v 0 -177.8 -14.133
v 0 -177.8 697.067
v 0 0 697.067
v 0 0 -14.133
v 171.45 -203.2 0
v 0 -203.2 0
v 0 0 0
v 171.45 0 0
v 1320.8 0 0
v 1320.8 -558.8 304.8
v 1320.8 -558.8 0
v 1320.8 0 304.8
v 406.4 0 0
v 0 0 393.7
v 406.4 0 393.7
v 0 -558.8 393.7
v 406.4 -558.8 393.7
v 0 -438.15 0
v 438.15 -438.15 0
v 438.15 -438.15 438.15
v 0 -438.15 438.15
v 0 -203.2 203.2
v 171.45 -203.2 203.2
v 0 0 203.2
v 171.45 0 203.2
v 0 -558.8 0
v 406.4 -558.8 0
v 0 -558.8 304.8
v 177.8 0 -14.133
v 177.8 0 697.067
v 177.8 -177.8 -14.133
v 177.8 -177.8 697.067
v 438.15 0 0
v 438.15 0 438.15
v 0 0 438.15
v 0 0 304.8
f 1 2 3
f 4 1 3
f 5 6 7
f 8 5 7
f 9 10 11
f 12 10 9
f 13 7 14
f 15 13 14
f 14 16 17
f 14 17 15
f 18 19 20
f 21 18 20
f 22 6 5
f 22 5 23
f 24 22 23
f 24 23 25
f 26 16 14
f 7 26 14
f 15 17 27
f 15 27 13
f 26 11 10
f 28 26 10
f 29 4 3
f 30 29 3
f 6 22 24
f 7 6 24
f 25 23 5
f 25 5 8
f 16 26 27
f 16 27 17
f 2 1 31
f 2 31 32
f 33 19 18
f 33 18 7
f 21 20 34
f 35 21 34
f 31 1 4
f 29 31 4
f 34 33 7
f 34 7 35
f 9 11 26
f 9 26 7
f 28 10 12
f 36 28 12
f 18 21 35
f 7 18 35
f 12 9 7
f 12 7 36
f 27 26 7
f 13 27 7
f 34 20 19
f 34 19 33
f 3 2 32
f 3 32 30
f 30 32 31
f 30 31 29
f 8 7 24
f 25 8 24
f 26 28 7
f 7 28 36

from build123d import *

# Parameters (mm, degrees)
F0_W     = 558.8
F0_H     = 393.7
F1_DEPTH = 406.4
F2_W     = 558.8
F2_H     = 304.8
F3_DEPTH = 1320.8
F4_W     = 177.8
F4_H     = 711.2
F5_DEPTH = 177.8
F6_W     = 438.15
F6_H     = 438.15
F7_DEPTH = 438.15
F8_W     = 203.2
F8_H     = 203.2
F9_DEPTH = 171.45


with BuildPart() as f1:
    # F0 (on Right) → F1 (new body)
    with BuildSketch(Plane.YZ):
        with Locations((-279.4, 196.85)):
            Rectangle(F0_W, F0_H)
    extrude(amount=F1_DEPTH)


with BuildPart() as f3:
    # F2 (on Right) → F3 (new body)
    with BuildSketch(Plane.YZ):
        with Locations((-279.4, 152.4)):
            Rectangle(F2_W, F2_H)
    extrude(amount=F3_DEPTH)


with BuildPart() as f5:
    # F4 (on Right) → F5 (new body)
    with BuildSketch(Plane.YZ):
        with Locations((-88.9, 341.467303)):
            Rectangle(F4_W, F4_H)
    extrude(amount=F5_DEPTH)


with BuildPart() as f7:
    # F6 (on Right) → F7 (new body)
    with BuildSketch(Plane.YZ):
        with Locations((-219.075, 219.075)):
            Rectangle(F6_W, F6_H)
    extrude(amount=F7_DEPTH)


with BuildPart() as f9:
    # F8 (on Right) → F9 (new body)
    with BuildSketch(Plane.YZ):
        with Locations((-101.6, 101.6)):
            Rectangle(F8_W, F8_H)
    extrude(amount=F9_DEPTH)


solid = Compound([f1.part, f3.part, f5.part, f7.part, f9.part])
